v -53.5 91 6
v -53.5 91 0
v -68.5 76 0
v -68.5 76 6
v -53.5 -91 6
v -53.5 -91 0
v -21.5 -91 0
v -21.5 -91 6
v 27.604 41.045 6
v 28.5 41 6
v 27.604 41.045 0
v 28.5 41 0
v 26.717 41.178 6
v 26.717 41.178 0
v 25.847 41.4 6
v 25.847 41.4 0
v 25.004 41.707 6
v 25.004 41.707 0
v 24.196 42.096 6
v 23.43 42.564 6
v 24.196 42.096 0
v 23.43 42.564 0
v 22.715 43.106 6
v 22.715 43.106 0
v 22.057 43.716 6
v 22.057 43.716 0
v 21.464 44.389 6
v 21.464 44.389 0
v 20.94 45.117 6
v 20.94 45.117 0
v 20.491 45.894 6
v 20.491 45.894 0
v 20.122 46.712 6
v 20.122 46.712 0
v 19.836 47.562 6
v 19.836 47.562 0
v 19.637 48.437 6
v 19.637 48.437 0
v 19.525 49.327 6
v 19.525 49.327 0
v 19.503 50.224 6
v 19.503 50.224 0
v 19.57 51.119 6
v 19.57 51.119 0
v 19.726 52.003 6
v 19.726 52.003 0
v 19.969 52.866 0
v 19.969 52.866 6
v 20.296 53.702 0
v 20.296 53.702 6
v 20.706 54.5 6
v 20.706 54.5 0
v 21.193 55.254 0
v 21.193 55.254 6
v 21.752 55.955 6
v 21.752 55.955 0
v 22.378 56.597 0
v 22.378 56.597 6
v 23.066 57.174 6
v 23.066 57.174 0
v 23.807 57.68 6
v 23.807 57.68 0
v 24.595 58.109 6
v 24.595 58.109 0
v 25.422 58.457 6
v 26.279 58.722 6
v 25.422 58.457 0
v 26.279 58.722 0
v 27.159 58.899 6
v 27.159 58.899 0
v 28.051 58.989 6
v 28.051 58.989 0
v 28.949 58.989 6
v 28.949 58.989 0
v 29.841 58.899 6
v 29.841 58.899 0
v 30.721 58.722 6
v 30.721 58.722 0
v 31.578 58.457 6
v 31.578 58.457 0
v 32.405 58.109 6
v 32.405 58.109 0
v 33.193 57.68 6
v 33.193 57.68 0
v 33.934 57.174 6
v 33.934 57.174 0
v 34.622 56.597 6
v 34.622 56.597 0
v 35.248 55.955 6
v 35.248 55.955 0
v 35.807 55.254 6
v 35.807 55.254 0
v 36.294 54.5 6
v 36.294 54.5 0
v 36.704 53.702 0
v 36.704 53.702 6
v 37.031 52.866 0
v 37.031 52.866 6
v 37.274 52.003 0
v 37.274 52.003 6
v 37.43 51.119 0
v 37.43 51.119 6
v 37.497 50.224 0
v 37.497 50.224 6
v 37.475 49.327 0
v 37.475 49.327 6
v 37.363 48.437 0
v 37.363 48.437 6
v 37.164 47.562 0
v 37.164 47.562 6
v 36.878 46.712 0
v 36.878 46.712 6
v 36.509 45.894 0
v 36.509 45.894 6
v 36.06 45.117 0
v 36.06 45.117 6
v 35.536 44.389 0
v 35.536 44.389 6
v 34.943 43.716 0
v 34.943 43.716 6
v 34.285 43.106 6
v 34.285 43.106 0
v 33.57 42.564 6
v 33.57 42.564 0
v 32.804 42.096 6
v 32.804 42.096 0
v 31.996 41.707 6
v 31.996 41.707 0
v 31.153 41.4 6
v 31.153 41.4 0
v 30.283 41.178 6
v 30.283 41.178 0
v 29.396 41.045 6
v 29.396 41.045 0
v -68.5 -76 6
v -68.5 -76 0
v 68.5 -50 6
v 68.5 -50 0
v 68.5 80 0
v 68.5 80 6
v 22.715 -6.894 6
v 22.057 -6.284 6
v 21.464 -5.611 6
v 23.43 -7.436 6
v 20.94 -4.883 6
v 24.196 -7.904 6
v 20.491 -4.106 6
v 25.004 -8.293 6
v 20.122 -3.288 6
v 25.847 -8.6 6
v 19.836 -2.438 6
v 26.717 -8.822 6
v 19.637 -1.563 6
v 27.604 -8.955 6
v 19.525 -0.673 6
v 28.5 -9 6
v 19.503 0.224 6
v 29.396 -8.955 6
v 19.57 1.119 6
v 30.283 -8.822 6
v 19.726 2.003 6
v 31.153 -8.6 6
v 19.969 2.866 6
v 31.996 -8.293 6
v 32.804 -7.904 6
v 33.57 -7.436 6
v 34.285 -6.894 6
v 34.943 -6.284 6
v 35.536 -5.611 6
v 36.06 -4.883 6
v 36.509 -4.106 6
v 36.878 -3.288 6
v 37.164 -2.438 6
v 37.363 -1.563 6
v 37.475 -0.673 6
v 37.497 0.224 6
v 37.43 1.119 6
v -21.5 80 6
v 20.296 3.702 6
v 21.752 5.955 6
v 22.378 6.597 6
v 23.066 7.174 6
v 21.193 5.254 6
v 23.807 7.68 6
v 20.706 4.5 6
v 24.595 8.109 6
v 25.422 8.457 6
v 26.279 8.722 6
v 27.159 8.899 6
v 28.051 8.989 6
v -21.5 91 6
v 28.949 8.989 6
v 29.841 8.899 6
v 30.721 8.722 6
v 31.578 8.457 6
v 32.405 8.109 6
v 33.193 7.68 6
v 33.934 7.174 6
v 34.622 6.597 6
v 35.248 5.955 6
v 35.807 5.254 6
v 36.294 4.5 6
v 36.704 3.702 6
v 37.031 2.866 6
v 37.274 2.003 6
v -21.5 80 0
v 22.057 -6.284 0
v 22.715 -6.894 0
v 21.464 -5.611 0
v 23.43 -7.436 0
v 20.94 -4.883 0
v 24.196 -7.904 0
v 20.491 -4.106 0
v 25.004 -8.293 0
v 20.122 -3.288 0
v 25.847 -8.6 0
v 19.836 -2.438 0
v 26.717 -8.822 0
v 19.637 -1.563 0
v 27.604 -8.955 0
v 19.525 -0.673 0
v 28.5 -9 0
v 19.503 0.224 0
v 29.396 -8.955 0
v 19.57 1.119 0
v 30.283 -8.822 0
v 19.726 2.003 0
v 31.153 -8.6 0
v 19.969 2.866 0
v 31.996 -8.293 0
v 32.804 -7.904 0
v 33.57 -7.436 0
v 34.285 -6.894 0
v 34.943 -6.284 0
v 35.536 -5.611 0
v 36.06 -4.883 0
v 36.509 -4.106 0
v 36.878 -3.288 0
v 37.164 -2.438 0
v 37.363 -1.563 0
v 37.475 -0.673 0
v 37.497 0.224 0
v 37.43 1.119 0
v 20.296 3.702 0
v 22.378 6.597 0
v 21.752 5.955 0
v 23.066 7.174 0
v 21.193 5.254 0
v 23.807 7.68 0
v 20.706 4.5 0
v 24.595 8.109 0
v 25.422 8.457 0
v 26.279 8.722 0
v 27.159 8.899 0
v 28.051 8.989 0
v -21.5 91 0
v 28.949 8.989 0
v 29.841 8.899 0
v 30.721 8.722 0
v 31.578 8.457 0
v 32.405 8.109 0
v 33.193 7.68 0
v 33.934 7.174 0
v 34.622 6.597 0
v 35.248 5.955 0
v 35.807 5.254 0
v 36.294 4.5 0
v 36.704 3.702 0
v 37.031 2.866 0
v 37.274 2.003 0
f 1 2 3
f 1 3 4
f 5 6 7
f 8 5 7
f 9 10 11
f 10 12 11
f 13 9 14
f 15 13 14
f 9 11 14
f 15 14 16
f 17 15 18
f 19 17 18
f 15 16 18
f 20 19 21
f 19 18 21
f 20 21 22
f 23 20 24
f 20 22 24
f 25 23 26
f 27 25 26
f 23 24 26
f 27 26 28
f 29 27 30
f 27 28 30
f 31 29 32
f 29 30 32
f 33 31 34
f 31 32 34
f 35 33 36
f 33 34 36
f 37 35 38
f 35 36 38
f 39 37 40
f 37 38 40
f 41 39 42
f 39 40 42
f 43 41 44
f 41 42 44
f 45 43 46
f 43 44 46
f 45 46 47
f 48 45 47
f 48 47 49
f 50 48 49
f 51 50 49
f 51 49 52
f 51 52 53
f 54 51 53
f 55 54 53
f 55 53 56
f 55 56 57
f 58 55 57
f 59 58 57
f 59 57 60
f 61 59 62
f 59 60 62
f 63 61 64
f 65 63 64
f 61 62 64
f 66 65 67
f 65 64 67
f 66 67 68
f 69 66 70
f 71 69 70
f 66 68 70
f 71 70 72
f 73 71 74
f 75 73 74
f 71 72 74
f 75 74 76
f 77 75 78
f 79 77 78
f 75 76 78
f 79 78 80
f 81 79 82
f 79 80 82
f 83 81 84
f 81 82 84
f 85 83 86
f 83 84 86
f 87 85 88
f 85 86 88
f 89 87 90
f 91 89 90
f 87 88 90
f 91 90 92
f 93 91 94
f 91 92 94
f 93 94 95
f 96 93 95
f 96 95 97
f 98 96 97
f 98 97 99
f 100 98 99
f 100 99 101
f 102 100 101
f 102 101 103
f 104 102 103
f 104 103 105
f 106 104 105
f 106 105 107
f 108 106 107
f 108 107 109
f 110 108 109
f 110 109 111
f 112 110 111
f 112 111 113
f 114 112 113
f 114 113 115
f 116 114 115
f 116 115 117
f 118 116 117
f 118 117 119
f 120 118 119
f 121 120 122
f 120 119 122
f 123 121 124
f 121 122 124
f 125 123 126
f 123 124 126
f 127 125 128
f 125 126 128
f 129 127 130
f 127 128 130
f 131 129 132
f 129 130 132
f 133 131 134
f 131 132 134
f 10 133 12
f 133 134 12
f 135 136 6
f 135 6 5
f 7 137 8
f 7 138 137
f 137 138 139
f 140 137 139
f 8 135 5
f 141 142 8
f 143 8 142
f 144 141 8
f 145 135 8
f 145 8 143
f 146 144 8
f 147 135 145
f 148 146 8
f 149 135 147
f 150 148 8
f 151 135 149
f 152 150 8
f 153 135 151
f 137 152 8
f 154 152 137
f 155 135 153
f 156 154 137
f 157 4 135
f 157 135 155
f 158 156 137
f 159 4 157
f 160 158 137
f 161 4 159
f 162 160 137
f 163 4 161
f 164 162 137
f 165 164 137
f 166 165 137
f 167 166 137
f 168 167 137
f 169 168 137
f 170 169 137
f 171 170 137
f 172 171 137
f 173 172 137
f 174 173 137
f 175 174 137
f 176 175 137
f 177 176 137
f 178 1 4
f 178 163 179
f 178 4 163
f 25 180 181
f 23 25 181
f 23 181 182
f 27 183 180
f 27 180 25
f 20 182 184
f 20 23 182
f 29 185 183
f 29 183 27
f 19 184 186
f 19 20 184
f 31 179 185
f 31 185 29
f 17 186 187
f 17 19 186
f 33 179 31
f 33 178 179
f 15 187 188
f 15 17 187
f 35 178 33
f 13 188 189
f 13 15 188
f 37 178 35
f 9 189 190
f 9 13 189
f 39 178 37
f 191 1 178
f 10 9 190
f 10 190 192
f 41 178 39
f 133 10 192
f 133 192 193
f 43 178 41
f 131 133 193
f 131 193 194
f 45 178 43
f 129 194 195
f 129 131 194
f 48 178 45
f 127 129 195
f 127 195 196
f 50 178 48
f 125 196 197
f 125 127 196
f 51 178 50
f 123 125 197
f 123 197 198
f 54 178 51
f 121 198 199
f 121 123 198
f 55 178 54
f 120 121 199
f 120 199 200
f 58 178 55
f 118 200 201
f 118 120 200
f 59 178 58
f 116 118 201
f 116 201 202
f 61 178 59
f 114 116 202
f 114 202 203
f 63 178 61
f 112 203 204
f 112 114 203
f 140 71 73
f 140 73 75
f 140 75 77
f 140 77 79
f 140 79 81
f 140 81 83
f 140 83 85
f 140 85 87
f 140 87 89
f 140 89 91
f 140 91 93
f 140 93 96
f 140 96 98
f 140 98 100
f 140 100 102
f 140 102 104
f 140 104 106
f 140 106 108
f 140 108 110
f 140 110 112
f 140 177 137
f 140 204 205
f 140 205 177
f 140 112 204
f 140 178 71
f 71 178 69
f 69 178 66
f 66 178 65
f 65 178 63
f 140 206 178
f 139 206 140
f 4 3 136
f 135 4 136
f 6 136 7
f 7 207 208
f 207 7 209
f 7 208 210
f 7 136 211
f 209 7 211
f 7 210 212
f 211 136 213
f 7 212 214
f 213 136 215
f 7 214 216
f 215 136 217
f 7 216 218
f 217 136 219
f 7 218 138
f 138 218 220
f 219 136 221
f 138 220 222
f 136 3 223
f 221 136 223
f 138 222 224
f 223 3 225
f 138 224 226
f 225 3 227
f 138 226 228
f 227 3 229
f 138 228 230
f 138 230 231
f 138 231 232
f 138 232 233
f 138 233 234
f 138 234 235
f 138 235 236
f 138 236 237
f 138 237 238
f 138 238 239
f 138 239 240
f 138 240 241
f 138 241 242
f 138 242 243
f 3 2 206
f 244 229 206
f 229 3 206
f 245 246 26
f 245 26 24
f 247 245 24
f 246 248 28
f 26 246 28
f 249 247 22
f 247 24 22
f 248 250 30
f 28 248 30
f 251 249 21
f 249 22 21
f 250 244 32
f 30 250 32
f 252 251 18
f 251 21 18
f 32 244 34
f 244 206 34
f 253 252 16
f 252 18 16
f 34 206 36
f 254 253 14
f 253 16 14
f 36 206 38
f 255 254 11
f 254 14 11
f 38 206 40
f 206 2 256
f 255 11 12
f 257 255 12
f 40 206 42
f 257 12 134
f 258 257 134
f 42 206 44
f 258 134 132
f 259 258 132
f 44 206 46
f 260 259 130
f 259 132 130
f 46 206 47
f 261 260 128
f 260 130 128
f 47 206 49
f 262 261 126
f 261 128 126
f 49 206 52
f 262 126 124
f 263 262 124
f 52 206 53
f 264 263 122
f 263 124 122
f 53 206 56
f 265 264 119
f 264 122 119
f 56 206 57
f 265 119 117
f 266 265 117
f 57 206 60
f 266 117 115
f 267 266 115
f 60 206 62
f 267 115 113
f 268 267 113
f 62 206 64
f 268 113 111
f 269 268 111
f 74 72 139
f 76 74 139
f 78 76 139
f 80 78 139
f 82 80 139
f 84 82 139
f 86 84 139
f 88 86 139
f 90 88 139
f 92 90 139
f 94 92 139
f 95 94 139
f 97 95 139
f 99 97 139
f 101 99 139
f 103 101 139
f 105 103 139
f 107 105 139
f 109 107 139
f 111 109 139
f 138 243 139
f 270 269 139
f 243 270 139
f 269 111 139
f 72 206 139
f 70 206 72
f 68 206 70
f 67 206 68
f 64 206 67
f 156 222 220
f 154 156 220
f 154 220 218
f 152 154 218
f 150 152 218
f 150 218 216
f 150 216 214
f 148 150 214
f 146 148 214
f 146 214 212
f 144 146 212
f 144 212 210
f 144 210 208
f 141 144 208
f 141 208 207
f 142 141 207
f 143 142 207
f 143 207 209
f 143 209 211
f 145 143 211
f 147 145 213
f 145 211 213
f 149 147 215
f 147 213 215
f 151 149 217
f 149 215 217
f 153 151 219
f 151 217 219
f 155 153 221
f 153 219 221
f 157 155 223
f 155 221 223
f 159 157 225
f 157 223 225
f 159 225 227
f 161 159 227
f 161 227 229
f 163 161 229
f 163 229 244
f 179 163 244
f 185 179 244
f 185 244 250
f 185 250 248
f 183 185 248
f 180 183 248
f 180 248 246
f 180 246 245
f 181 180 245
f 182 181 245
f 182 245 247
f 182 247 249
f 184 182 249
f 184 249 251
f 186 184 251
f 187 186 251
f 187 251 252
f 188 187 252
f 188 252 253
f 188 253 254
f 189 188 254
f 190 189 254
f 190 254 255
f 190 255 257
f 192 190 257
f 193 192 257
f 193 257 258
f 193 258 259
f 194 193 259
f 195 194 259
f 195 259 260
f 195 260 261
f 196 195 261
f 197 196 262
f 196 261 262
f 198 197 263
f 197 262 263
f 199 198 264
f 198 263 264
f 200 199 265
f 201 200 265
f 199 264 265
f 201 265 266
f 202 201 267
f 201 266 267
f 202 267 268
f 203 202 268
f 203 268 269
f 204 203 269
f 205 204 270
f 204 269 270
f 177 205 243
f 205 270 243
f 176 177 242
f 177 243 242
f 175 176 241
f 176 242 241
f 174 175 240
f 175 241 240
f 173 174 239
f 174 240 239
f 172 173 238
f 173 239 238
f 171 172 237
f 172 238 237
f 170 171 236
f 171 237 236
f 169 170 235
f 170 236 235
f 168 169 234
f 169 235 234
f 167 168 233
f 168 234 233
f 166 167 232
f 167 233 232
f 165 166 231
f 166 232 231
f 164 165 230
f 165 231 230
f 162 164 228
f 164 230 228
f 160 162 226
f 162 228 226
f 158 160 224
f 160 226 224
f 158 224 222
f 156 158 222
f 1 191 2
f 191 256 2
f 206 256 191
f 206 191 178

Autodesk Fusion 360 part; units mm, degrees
sketch "スケッチ1" plane through (0, 0, 0) normal (0, 0, 1) x (1, 0, 0) in component "GPL H200 to H150G1"
  line L0 (-21.5, 91) -> (-68.5, 91)
  line L1 (-68.5, 91) -> (-68.5, -91)
  line L2 (-68.5, -91) -> (-21.5, -91)
  line L3 (68.5, -50) -> (68.5, 80)
  line L4 (60.2198, 80) -> (-68.5, -91) construction
  line L5 (-68.5, 91) -> (45.5182, -60.4695) construction
  line L6 (-21.5, 91) -> (-21.5, 80)
  line L7 (-21.5, 80) -> (68.5, 80)
  line L8 (-68.5, -91) -> (-21.5, -91) construction
  line L9 (68.5, -50) -> (-21.5, -91)
  dimension "d14_1" = 18
  dimension "d15_1" = 180
extrude "押し出し1" add sketch "スケッチ1" along normal blind 6 makes body 1 in component "GPL H200 to H150G1"
chamfer "面取り1" distance 15 angle 45 2 edges at (-68.5, -91, 3) (-68.5, 91, 3) on bodies 1 in component "GPL H200 to H150G1"
sketch "スケッチ2" plane through (0, 0, 6) normal (0, 0, 1) x (-1, 0, 0) in component "GPL H200 to H150G1"
  line L0 (53.5, -91) -> (68.5, -76)
  line L1 (68.5, -76) -> (68.5, 76)
  line L2 (68.5, 76) -> (53.5, 91)
  line L3 (53.5, 91) -> (21.5, 91)
  line L4 (21.5, 91) -> (-68.5, 50)
  line L5 (-68.5, 50) -> (-68.5, -80)
  line L6 (-68.5, -80) -> (21.5, -80)
  line L7 (21.5, -80) -> (21.5, -91)
  line L8 (21.5, -91) -> (53.5, -91)
  line L9 (-68.5, -80) -> (-28.5, -80) construction
  line L10 (-28.5, -80) -> (-28.5, -50) construction
  line L11 (-28.5, -50) -> (-68.5, -50) construction
  line L12 (-68.5, -50) -> (-68.5, -80) construction
  line L13 (-68.5, -50) -> (-28.5, -50) construction
  line L14 (-28.5, -50) -> (-28.5, 0) construction
  line L15 (-28.5, 0) -> (-68.5, 0) construction
  line L16 (-68.5, 0) -> (-68.5, -50) construction
  point P0 (-28.5, -50)
  point P1 (-28.5, 0)
  dimension "d10" = 40
  dimension "d11" = 30
  dimension "d12" = 40
  dimension "d13" = 50
hole "穴1" at (28.5, 50, 6) at (28.5, 0, 6) direction (0, 0, -1) diameter 18 end through all bodies 1 1 in component "GPL H200 to H150G1"
sketch "スケッチ1 (2)" plane through (0, 0, 0) normal (0, 0, 1) x (1, 0, 0) in component "Component'"
  line L0 (-21.5, 91) -> (-68.5, 91)
  line L1 (-68.5, 91) -> (-68.5, -91)
  line L2 (-68.5, -91) -> (-21.5, -91)
  line L3 (68.5, -50) -> (68.5, 80)
  line L4 (60.2198, 80) -> (-68.5, -91) construction
  line L5 (-68.5, 91) -> (45.5182, -60.4695) construction
  line L6 (-21.5, 91) -> (-21.5, 80)
  line L7 (-21.5, 80) -> (68.5, 80)
  line L8 (-68.5, -91) -> (-21.5, -91) construction
  line L9 (68.5, -50) -> (-21.5, -91)
  dimension "d2_1" = 182
  dimension "d5_1" = 47
extrude "押し出し1'" add sketch "スケッチ1 (2)" along normal blind 6 separate body makes body 2 in component "Component'"
chamfer "面取り1'" distance 15 angle 45 2 edges at (-68.5, -91, 3) (-68.5, 91, 3) on bodies 2 in component "Component'"
sketch "スケッチ2 (2)" plane through (0, 0, 6) normal (0, 0, 1) x (-1, 0, 0) in component "Component'"
  line L0 (53.5, -91) -> (68.5, -76)
  line L1 (68.5, -76) -> (68.5, 76)
  line L2 (68.5, 76) -> (53.5, 91)
  line L3 (53.5, 91) -> (21.5, 91)
  line L4 (21.5, 91) -> (-68.5, 50)
  line L5 (-68.5, 50) -> (-68.5, -80)
  line L6 (-68.5, -80) -> (21.5, -80)
  line L7 (21.5, -80) -> (21.5, -91)
  line L8 (21.5, -91) -> (53.5, -91)
  line L9 (-68.5, -80) -> (-28.5, -80) construction
  line L10 (-28.5, -80) -> (-28.5, -50) construction
  line L11 (-28.5, -50) -> (-68.5, -50) construction
  line L12 (-68.5, -50) -> (-68.5, -80) construction
  line L13 (-68.5, -50) -> (-28.5, -50) construction
  line L14 (-28.5, -50) -> (-28.5, 0) construction
  line L15 (-28.5, 0) -> (-68.5, 0) construction
  line L16 (-68.5, 0) -> (-68.5, -50) construction
  point P0 (-28.5, -50)
  point P1 (-28.5, 0)
  dimension "d10_1" = 40
  dimension "d11_1" = 30
  dimension "d12_1" = 40
  dimension "d13_1" = 50
hole "穴1'" at (28.5, 50, 6) at (28.5, 0, 6) direction (0, 0, -1) diameter 18 end through all bodies 2 2 in component "Component'"
copy_body "CutPasteBodies1" bodies 1 removing the originals makes body 3
equation "d5 = 15 mm + 32 mm"
equation "d5_1 = 15 mm + 32 mm"
